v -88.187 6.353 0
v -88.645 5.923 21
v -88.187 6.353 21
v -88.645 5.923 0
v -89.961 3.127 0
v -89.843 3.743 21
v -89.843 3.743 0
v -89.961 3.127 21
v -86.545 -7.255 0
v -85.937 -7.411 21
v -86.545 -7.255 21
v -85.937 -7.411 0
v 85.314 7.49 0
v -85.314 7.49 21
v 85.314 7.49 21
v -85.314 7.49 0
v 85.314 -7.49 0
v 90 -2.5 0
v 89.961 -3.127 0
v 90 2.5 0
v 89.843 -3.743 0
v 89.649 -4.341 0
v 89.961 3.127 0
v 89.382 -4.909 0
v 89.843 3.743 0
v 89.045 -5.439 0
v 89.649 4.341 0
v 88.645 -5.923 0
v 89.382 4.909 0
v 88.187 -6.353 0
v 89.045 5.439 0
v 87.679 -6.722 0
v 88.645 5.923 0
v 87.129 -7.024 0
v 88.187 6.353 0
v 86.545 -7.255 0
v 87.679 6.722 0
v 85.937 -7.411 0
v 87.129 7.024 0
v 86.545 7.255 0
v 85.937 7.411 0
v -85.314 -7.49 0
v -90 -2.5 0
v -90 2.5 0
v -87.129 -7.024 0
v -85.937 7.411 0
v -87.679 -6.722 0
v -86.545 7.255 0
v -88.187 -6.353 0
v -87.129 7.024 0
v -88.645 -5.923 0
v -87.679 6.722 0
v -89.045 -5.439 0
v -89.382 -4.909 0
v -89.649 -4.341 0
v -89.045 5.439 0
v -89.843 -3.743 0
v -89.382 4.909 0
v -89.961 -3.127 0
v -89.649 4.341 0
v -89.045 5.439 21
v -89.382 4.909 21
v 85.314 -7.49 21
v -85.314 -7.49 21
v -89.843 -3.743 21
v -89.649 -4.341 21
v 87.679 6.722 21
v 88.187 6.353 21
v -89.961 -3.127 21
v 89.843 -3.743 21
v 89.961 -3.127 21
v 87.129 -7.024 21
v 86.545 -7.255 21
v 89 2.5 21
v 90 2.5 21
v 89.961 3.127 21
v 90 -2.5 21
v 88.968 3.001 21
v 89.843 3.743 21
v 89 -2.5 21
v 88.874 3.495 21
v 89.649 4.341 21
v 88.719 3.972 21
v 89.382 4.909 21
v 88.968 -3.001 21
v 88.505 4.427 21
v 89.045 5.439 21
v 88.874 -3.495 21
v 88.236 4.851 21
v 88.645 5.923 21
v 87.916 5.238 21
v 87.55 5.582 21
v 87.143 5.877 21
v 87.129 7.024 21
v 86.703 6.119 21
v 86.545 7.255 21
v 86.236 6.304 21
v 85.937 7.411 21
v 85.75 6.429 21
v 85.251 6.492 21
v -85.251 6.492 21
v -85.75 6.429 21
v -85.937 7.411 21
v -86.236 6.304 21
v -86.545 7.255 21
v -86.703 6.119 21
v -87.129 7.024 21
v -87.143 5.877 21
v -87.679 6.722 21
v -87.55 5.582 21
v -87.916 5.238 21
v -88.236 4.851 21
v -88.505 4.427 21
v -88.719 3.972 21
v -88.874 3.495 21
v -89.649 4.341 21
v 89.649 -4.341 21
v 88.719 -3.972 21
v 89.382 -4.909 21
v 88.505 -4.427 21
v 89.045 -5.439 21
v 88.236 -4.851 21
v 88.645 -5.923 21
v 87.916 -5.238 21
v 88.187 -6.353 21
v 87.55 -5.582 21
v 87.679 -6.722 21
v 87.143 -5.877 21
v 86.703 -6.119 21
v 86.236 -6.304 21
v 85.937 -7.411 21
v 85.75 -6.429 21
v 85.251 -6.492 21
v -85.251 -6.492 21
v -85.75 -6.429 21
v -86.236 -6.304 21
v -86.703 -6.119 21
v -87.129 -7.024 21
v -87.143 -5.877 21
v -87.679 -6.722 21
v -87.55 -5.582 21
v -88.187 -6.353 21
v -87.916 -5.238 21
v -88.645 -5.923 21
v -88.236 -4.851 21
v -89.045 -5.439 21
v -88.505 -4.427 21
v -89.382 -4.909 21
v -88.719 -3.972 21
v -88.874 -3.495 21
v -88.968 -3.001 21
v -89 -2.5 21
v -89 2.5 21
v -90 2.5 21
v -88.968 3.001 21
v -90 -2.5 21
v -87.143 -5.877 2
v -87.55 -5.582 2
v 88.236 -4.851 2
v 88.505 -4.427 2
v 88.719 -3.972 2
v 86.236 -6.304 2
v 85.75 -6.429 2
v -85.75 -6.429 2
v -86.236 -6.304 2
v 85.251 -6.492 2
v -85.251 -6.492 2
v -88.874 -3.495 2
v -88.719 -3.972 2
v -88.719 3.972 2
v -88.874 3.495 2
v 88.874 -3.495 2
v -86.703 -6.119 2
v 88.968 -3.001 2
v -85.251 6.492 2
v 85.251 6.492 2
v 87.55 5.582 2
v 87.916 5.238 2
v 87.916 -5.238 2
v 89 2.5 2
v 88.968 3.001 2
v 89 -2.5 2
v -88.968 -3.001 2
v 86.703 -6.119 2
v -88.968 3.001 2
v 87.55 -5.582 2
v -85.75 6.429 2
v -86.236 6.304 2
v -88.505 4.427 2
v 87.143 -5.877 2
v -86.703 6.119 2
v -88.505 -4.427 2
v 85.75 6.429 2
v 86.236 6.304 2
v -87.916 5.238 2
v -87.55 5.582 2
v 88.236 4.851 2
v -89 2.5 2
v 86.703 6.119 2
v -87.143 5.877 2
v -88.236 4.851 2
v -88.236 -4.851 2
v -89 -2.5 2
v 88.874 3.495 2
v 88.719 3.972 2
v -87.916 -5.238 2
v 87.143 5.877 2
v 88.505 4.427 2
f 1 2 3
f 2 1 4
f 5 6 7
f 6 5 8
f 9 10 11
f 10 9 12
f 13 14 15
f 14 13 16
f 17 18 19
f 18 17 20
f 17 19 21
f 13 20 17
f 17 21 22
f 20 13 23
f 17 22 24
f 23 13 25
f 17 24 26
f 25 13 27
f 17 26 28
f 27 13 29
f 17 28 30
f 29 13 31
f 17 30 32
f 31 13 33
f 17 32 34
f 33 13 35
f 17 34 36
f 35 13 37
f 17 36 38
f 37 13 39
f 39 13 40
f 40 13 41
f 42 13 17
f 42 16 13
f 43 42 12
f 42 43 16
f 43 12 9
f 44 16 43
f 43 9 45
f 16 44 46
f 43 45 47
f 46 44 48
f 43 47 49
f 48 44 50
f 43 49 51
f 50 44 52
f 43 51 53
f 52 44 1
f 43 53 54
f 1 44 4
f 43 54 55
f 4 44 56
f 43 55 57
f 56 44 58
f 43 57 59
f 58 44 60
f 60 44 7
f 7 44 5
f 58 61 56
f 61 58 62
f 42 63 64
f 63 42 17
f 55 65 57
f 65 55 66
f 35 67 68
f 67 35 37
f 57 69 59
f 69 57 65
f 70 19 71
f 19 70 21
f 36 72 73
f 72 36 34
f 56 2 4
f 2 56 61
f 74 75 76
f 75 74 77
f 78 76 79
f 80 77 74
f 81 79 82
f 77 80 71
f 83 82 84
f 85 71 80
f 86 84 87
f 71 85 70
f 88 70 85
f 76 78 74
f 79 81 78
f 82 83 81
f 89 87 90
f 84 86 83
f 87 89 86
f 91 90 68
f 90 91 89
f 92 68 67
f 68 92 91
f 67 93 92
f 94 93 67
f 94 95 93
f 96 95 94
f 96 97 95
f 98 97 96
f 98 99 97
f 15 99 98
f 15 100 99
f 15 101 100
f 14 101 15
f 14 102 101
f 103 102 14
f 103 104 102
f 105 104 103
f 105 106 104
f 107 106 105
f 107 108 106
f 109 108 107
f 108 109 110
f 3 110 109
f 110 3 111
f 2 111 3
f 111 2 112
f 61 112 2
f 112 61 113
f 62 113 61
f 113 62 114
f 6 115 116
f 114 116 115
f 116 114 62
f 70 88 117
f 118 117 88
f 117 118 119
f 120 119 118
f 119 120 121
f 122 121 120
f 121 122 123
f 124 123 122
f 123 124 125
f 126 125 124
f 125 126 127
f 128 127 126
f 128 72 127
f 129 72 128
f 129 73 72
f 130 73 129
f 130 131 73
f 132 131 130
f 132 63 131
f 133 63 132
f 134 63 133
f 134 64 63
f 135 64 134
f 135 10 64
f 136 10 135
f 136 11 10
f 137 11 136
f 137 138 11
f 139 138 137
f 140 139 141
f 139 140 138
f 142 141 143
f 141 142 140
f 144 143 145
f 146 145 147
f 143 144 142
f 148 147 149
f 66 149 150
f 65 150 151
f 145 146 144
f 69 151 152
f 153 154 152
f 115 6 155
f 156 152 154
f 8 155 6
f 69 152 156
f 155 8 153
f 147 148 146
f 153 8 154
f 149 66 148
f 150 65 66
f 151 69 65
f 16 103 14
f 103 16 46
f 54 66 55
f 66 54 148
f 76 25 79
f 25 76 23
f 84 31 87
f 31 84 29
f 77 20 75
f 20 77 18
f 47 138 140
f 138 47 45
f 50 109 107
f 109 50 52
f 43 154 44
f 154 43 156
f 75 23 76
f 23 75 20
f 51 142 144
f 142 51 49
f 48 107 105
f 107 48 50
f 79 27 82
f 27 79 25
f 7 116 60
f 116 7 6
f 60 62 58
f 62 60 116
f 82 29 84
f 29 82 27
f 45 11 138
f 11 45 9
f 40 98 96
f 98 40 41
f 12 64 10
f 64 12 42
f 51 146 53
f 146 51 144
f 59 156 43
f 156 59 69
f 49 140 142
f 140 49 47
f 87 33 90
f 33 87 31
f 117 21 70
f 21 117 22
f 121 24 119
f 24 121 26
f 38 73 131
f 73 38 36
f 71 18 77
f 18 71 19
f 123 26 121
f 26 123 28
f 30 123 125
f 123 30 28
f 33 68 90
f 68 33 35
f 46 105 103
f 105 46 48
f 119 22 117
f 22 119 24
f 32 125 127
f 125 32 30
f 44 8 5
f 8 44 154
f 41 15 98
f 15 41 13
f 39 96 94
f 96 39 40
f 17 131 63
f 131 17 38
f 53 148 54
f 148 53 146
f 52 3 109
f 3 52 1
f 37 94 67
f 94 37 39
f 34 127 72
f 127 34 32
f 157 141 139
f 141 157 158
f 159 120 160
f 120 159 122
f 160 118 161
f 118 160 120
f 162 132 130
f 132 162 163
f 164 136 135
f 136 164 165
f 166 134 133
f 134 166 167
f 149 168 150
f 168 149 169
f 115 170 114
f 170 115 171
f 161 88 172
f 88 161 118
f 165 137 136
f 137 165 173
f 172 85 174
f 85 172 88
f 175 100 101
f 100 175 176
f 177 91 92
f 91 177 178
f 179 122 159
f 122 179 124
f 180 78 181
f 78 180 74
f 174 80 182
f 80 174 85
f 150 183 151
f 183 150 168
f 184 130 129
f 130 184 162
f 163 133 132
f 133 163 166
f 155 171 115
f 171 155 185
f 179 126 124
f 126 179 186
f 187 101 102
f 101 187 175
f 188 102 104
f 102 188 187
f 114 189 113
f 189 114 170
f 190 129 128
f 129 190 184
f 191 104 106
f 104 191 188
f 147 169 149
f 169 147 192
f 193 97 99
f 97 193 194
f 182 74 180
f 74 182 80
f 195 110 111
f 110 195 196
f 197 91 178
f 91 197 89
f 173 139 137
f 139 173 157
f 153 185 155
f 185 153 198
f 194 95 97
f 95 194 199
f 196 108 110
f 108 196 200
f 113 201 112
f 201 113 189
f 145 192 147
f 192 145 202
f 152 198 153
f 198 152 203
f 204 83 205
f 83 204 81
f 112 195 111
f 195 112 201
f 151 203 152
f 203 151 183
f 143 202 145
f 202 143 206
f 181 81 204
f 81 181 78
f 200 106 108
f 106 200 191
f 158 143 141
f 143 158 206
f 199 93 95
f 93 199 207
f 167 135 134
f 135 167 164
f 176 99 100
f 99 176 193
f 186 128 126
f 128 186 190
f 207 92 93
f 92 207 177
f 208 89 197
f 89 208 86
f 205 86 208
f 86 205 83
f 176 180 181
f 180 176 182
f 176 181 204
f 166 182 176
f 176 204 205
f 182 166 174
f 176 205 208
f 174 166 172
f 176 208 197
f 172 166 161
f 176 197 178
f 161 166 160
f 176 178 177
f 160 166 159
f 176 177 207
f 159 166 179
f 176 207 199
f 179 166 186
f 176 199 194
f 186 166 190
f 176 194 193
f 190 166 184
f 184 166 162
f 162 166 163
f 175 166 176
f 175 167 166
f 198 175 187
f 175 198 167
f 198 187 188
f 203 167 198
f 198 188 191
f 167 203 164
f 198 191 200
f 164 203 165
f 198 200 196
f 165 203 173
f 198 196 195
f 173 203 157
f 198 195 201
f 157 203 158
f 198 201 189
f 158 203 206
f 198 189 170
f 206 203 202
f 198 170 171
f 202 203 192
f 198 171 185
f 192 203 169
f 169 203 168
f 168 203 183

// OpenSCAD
$fn = 50;


difference() {
	union() {
		hull() {
			translate(v = [-85.0000000000, 2.5000000000, 0]) {
				cylinder(h = 21, r = 5);
			}
			translate(v = [85.0000000000, 2.5000000000, 0]) {
				cylinder(h = 21, r = 5);
			}
			translate(v = [-85.0000000000, -2.5000000000, 0]) {
				cylinder(h = 21, r = 5);
			}
			translate(v = [85.0000000000, -2.5000000000, 0]) {
				cylinder(h = 21, r = 5);
			}
		}
	}
	union() {
		translate(v = [0, 0, 2]) {
			hull() {
				translate(v = [-85.0000000000, 2.5000000000, 0]) {
					cylinder(h = 19, r = 4);
				}
				translate(v = [85.0000000000, 2.5000000000, 0]) {
					cylinder(h = 19, r = 4);
				}
				translate(v = [-85.0000000000, -2.5000000000, 0]) {
					cylinder(h = 19, r = 4);
				}
				translate(v = [85.0000000000, -2.5000000000, 0]) {
					cylinder(h = 19, r = 4);
				}
			}
		}
	}
}
